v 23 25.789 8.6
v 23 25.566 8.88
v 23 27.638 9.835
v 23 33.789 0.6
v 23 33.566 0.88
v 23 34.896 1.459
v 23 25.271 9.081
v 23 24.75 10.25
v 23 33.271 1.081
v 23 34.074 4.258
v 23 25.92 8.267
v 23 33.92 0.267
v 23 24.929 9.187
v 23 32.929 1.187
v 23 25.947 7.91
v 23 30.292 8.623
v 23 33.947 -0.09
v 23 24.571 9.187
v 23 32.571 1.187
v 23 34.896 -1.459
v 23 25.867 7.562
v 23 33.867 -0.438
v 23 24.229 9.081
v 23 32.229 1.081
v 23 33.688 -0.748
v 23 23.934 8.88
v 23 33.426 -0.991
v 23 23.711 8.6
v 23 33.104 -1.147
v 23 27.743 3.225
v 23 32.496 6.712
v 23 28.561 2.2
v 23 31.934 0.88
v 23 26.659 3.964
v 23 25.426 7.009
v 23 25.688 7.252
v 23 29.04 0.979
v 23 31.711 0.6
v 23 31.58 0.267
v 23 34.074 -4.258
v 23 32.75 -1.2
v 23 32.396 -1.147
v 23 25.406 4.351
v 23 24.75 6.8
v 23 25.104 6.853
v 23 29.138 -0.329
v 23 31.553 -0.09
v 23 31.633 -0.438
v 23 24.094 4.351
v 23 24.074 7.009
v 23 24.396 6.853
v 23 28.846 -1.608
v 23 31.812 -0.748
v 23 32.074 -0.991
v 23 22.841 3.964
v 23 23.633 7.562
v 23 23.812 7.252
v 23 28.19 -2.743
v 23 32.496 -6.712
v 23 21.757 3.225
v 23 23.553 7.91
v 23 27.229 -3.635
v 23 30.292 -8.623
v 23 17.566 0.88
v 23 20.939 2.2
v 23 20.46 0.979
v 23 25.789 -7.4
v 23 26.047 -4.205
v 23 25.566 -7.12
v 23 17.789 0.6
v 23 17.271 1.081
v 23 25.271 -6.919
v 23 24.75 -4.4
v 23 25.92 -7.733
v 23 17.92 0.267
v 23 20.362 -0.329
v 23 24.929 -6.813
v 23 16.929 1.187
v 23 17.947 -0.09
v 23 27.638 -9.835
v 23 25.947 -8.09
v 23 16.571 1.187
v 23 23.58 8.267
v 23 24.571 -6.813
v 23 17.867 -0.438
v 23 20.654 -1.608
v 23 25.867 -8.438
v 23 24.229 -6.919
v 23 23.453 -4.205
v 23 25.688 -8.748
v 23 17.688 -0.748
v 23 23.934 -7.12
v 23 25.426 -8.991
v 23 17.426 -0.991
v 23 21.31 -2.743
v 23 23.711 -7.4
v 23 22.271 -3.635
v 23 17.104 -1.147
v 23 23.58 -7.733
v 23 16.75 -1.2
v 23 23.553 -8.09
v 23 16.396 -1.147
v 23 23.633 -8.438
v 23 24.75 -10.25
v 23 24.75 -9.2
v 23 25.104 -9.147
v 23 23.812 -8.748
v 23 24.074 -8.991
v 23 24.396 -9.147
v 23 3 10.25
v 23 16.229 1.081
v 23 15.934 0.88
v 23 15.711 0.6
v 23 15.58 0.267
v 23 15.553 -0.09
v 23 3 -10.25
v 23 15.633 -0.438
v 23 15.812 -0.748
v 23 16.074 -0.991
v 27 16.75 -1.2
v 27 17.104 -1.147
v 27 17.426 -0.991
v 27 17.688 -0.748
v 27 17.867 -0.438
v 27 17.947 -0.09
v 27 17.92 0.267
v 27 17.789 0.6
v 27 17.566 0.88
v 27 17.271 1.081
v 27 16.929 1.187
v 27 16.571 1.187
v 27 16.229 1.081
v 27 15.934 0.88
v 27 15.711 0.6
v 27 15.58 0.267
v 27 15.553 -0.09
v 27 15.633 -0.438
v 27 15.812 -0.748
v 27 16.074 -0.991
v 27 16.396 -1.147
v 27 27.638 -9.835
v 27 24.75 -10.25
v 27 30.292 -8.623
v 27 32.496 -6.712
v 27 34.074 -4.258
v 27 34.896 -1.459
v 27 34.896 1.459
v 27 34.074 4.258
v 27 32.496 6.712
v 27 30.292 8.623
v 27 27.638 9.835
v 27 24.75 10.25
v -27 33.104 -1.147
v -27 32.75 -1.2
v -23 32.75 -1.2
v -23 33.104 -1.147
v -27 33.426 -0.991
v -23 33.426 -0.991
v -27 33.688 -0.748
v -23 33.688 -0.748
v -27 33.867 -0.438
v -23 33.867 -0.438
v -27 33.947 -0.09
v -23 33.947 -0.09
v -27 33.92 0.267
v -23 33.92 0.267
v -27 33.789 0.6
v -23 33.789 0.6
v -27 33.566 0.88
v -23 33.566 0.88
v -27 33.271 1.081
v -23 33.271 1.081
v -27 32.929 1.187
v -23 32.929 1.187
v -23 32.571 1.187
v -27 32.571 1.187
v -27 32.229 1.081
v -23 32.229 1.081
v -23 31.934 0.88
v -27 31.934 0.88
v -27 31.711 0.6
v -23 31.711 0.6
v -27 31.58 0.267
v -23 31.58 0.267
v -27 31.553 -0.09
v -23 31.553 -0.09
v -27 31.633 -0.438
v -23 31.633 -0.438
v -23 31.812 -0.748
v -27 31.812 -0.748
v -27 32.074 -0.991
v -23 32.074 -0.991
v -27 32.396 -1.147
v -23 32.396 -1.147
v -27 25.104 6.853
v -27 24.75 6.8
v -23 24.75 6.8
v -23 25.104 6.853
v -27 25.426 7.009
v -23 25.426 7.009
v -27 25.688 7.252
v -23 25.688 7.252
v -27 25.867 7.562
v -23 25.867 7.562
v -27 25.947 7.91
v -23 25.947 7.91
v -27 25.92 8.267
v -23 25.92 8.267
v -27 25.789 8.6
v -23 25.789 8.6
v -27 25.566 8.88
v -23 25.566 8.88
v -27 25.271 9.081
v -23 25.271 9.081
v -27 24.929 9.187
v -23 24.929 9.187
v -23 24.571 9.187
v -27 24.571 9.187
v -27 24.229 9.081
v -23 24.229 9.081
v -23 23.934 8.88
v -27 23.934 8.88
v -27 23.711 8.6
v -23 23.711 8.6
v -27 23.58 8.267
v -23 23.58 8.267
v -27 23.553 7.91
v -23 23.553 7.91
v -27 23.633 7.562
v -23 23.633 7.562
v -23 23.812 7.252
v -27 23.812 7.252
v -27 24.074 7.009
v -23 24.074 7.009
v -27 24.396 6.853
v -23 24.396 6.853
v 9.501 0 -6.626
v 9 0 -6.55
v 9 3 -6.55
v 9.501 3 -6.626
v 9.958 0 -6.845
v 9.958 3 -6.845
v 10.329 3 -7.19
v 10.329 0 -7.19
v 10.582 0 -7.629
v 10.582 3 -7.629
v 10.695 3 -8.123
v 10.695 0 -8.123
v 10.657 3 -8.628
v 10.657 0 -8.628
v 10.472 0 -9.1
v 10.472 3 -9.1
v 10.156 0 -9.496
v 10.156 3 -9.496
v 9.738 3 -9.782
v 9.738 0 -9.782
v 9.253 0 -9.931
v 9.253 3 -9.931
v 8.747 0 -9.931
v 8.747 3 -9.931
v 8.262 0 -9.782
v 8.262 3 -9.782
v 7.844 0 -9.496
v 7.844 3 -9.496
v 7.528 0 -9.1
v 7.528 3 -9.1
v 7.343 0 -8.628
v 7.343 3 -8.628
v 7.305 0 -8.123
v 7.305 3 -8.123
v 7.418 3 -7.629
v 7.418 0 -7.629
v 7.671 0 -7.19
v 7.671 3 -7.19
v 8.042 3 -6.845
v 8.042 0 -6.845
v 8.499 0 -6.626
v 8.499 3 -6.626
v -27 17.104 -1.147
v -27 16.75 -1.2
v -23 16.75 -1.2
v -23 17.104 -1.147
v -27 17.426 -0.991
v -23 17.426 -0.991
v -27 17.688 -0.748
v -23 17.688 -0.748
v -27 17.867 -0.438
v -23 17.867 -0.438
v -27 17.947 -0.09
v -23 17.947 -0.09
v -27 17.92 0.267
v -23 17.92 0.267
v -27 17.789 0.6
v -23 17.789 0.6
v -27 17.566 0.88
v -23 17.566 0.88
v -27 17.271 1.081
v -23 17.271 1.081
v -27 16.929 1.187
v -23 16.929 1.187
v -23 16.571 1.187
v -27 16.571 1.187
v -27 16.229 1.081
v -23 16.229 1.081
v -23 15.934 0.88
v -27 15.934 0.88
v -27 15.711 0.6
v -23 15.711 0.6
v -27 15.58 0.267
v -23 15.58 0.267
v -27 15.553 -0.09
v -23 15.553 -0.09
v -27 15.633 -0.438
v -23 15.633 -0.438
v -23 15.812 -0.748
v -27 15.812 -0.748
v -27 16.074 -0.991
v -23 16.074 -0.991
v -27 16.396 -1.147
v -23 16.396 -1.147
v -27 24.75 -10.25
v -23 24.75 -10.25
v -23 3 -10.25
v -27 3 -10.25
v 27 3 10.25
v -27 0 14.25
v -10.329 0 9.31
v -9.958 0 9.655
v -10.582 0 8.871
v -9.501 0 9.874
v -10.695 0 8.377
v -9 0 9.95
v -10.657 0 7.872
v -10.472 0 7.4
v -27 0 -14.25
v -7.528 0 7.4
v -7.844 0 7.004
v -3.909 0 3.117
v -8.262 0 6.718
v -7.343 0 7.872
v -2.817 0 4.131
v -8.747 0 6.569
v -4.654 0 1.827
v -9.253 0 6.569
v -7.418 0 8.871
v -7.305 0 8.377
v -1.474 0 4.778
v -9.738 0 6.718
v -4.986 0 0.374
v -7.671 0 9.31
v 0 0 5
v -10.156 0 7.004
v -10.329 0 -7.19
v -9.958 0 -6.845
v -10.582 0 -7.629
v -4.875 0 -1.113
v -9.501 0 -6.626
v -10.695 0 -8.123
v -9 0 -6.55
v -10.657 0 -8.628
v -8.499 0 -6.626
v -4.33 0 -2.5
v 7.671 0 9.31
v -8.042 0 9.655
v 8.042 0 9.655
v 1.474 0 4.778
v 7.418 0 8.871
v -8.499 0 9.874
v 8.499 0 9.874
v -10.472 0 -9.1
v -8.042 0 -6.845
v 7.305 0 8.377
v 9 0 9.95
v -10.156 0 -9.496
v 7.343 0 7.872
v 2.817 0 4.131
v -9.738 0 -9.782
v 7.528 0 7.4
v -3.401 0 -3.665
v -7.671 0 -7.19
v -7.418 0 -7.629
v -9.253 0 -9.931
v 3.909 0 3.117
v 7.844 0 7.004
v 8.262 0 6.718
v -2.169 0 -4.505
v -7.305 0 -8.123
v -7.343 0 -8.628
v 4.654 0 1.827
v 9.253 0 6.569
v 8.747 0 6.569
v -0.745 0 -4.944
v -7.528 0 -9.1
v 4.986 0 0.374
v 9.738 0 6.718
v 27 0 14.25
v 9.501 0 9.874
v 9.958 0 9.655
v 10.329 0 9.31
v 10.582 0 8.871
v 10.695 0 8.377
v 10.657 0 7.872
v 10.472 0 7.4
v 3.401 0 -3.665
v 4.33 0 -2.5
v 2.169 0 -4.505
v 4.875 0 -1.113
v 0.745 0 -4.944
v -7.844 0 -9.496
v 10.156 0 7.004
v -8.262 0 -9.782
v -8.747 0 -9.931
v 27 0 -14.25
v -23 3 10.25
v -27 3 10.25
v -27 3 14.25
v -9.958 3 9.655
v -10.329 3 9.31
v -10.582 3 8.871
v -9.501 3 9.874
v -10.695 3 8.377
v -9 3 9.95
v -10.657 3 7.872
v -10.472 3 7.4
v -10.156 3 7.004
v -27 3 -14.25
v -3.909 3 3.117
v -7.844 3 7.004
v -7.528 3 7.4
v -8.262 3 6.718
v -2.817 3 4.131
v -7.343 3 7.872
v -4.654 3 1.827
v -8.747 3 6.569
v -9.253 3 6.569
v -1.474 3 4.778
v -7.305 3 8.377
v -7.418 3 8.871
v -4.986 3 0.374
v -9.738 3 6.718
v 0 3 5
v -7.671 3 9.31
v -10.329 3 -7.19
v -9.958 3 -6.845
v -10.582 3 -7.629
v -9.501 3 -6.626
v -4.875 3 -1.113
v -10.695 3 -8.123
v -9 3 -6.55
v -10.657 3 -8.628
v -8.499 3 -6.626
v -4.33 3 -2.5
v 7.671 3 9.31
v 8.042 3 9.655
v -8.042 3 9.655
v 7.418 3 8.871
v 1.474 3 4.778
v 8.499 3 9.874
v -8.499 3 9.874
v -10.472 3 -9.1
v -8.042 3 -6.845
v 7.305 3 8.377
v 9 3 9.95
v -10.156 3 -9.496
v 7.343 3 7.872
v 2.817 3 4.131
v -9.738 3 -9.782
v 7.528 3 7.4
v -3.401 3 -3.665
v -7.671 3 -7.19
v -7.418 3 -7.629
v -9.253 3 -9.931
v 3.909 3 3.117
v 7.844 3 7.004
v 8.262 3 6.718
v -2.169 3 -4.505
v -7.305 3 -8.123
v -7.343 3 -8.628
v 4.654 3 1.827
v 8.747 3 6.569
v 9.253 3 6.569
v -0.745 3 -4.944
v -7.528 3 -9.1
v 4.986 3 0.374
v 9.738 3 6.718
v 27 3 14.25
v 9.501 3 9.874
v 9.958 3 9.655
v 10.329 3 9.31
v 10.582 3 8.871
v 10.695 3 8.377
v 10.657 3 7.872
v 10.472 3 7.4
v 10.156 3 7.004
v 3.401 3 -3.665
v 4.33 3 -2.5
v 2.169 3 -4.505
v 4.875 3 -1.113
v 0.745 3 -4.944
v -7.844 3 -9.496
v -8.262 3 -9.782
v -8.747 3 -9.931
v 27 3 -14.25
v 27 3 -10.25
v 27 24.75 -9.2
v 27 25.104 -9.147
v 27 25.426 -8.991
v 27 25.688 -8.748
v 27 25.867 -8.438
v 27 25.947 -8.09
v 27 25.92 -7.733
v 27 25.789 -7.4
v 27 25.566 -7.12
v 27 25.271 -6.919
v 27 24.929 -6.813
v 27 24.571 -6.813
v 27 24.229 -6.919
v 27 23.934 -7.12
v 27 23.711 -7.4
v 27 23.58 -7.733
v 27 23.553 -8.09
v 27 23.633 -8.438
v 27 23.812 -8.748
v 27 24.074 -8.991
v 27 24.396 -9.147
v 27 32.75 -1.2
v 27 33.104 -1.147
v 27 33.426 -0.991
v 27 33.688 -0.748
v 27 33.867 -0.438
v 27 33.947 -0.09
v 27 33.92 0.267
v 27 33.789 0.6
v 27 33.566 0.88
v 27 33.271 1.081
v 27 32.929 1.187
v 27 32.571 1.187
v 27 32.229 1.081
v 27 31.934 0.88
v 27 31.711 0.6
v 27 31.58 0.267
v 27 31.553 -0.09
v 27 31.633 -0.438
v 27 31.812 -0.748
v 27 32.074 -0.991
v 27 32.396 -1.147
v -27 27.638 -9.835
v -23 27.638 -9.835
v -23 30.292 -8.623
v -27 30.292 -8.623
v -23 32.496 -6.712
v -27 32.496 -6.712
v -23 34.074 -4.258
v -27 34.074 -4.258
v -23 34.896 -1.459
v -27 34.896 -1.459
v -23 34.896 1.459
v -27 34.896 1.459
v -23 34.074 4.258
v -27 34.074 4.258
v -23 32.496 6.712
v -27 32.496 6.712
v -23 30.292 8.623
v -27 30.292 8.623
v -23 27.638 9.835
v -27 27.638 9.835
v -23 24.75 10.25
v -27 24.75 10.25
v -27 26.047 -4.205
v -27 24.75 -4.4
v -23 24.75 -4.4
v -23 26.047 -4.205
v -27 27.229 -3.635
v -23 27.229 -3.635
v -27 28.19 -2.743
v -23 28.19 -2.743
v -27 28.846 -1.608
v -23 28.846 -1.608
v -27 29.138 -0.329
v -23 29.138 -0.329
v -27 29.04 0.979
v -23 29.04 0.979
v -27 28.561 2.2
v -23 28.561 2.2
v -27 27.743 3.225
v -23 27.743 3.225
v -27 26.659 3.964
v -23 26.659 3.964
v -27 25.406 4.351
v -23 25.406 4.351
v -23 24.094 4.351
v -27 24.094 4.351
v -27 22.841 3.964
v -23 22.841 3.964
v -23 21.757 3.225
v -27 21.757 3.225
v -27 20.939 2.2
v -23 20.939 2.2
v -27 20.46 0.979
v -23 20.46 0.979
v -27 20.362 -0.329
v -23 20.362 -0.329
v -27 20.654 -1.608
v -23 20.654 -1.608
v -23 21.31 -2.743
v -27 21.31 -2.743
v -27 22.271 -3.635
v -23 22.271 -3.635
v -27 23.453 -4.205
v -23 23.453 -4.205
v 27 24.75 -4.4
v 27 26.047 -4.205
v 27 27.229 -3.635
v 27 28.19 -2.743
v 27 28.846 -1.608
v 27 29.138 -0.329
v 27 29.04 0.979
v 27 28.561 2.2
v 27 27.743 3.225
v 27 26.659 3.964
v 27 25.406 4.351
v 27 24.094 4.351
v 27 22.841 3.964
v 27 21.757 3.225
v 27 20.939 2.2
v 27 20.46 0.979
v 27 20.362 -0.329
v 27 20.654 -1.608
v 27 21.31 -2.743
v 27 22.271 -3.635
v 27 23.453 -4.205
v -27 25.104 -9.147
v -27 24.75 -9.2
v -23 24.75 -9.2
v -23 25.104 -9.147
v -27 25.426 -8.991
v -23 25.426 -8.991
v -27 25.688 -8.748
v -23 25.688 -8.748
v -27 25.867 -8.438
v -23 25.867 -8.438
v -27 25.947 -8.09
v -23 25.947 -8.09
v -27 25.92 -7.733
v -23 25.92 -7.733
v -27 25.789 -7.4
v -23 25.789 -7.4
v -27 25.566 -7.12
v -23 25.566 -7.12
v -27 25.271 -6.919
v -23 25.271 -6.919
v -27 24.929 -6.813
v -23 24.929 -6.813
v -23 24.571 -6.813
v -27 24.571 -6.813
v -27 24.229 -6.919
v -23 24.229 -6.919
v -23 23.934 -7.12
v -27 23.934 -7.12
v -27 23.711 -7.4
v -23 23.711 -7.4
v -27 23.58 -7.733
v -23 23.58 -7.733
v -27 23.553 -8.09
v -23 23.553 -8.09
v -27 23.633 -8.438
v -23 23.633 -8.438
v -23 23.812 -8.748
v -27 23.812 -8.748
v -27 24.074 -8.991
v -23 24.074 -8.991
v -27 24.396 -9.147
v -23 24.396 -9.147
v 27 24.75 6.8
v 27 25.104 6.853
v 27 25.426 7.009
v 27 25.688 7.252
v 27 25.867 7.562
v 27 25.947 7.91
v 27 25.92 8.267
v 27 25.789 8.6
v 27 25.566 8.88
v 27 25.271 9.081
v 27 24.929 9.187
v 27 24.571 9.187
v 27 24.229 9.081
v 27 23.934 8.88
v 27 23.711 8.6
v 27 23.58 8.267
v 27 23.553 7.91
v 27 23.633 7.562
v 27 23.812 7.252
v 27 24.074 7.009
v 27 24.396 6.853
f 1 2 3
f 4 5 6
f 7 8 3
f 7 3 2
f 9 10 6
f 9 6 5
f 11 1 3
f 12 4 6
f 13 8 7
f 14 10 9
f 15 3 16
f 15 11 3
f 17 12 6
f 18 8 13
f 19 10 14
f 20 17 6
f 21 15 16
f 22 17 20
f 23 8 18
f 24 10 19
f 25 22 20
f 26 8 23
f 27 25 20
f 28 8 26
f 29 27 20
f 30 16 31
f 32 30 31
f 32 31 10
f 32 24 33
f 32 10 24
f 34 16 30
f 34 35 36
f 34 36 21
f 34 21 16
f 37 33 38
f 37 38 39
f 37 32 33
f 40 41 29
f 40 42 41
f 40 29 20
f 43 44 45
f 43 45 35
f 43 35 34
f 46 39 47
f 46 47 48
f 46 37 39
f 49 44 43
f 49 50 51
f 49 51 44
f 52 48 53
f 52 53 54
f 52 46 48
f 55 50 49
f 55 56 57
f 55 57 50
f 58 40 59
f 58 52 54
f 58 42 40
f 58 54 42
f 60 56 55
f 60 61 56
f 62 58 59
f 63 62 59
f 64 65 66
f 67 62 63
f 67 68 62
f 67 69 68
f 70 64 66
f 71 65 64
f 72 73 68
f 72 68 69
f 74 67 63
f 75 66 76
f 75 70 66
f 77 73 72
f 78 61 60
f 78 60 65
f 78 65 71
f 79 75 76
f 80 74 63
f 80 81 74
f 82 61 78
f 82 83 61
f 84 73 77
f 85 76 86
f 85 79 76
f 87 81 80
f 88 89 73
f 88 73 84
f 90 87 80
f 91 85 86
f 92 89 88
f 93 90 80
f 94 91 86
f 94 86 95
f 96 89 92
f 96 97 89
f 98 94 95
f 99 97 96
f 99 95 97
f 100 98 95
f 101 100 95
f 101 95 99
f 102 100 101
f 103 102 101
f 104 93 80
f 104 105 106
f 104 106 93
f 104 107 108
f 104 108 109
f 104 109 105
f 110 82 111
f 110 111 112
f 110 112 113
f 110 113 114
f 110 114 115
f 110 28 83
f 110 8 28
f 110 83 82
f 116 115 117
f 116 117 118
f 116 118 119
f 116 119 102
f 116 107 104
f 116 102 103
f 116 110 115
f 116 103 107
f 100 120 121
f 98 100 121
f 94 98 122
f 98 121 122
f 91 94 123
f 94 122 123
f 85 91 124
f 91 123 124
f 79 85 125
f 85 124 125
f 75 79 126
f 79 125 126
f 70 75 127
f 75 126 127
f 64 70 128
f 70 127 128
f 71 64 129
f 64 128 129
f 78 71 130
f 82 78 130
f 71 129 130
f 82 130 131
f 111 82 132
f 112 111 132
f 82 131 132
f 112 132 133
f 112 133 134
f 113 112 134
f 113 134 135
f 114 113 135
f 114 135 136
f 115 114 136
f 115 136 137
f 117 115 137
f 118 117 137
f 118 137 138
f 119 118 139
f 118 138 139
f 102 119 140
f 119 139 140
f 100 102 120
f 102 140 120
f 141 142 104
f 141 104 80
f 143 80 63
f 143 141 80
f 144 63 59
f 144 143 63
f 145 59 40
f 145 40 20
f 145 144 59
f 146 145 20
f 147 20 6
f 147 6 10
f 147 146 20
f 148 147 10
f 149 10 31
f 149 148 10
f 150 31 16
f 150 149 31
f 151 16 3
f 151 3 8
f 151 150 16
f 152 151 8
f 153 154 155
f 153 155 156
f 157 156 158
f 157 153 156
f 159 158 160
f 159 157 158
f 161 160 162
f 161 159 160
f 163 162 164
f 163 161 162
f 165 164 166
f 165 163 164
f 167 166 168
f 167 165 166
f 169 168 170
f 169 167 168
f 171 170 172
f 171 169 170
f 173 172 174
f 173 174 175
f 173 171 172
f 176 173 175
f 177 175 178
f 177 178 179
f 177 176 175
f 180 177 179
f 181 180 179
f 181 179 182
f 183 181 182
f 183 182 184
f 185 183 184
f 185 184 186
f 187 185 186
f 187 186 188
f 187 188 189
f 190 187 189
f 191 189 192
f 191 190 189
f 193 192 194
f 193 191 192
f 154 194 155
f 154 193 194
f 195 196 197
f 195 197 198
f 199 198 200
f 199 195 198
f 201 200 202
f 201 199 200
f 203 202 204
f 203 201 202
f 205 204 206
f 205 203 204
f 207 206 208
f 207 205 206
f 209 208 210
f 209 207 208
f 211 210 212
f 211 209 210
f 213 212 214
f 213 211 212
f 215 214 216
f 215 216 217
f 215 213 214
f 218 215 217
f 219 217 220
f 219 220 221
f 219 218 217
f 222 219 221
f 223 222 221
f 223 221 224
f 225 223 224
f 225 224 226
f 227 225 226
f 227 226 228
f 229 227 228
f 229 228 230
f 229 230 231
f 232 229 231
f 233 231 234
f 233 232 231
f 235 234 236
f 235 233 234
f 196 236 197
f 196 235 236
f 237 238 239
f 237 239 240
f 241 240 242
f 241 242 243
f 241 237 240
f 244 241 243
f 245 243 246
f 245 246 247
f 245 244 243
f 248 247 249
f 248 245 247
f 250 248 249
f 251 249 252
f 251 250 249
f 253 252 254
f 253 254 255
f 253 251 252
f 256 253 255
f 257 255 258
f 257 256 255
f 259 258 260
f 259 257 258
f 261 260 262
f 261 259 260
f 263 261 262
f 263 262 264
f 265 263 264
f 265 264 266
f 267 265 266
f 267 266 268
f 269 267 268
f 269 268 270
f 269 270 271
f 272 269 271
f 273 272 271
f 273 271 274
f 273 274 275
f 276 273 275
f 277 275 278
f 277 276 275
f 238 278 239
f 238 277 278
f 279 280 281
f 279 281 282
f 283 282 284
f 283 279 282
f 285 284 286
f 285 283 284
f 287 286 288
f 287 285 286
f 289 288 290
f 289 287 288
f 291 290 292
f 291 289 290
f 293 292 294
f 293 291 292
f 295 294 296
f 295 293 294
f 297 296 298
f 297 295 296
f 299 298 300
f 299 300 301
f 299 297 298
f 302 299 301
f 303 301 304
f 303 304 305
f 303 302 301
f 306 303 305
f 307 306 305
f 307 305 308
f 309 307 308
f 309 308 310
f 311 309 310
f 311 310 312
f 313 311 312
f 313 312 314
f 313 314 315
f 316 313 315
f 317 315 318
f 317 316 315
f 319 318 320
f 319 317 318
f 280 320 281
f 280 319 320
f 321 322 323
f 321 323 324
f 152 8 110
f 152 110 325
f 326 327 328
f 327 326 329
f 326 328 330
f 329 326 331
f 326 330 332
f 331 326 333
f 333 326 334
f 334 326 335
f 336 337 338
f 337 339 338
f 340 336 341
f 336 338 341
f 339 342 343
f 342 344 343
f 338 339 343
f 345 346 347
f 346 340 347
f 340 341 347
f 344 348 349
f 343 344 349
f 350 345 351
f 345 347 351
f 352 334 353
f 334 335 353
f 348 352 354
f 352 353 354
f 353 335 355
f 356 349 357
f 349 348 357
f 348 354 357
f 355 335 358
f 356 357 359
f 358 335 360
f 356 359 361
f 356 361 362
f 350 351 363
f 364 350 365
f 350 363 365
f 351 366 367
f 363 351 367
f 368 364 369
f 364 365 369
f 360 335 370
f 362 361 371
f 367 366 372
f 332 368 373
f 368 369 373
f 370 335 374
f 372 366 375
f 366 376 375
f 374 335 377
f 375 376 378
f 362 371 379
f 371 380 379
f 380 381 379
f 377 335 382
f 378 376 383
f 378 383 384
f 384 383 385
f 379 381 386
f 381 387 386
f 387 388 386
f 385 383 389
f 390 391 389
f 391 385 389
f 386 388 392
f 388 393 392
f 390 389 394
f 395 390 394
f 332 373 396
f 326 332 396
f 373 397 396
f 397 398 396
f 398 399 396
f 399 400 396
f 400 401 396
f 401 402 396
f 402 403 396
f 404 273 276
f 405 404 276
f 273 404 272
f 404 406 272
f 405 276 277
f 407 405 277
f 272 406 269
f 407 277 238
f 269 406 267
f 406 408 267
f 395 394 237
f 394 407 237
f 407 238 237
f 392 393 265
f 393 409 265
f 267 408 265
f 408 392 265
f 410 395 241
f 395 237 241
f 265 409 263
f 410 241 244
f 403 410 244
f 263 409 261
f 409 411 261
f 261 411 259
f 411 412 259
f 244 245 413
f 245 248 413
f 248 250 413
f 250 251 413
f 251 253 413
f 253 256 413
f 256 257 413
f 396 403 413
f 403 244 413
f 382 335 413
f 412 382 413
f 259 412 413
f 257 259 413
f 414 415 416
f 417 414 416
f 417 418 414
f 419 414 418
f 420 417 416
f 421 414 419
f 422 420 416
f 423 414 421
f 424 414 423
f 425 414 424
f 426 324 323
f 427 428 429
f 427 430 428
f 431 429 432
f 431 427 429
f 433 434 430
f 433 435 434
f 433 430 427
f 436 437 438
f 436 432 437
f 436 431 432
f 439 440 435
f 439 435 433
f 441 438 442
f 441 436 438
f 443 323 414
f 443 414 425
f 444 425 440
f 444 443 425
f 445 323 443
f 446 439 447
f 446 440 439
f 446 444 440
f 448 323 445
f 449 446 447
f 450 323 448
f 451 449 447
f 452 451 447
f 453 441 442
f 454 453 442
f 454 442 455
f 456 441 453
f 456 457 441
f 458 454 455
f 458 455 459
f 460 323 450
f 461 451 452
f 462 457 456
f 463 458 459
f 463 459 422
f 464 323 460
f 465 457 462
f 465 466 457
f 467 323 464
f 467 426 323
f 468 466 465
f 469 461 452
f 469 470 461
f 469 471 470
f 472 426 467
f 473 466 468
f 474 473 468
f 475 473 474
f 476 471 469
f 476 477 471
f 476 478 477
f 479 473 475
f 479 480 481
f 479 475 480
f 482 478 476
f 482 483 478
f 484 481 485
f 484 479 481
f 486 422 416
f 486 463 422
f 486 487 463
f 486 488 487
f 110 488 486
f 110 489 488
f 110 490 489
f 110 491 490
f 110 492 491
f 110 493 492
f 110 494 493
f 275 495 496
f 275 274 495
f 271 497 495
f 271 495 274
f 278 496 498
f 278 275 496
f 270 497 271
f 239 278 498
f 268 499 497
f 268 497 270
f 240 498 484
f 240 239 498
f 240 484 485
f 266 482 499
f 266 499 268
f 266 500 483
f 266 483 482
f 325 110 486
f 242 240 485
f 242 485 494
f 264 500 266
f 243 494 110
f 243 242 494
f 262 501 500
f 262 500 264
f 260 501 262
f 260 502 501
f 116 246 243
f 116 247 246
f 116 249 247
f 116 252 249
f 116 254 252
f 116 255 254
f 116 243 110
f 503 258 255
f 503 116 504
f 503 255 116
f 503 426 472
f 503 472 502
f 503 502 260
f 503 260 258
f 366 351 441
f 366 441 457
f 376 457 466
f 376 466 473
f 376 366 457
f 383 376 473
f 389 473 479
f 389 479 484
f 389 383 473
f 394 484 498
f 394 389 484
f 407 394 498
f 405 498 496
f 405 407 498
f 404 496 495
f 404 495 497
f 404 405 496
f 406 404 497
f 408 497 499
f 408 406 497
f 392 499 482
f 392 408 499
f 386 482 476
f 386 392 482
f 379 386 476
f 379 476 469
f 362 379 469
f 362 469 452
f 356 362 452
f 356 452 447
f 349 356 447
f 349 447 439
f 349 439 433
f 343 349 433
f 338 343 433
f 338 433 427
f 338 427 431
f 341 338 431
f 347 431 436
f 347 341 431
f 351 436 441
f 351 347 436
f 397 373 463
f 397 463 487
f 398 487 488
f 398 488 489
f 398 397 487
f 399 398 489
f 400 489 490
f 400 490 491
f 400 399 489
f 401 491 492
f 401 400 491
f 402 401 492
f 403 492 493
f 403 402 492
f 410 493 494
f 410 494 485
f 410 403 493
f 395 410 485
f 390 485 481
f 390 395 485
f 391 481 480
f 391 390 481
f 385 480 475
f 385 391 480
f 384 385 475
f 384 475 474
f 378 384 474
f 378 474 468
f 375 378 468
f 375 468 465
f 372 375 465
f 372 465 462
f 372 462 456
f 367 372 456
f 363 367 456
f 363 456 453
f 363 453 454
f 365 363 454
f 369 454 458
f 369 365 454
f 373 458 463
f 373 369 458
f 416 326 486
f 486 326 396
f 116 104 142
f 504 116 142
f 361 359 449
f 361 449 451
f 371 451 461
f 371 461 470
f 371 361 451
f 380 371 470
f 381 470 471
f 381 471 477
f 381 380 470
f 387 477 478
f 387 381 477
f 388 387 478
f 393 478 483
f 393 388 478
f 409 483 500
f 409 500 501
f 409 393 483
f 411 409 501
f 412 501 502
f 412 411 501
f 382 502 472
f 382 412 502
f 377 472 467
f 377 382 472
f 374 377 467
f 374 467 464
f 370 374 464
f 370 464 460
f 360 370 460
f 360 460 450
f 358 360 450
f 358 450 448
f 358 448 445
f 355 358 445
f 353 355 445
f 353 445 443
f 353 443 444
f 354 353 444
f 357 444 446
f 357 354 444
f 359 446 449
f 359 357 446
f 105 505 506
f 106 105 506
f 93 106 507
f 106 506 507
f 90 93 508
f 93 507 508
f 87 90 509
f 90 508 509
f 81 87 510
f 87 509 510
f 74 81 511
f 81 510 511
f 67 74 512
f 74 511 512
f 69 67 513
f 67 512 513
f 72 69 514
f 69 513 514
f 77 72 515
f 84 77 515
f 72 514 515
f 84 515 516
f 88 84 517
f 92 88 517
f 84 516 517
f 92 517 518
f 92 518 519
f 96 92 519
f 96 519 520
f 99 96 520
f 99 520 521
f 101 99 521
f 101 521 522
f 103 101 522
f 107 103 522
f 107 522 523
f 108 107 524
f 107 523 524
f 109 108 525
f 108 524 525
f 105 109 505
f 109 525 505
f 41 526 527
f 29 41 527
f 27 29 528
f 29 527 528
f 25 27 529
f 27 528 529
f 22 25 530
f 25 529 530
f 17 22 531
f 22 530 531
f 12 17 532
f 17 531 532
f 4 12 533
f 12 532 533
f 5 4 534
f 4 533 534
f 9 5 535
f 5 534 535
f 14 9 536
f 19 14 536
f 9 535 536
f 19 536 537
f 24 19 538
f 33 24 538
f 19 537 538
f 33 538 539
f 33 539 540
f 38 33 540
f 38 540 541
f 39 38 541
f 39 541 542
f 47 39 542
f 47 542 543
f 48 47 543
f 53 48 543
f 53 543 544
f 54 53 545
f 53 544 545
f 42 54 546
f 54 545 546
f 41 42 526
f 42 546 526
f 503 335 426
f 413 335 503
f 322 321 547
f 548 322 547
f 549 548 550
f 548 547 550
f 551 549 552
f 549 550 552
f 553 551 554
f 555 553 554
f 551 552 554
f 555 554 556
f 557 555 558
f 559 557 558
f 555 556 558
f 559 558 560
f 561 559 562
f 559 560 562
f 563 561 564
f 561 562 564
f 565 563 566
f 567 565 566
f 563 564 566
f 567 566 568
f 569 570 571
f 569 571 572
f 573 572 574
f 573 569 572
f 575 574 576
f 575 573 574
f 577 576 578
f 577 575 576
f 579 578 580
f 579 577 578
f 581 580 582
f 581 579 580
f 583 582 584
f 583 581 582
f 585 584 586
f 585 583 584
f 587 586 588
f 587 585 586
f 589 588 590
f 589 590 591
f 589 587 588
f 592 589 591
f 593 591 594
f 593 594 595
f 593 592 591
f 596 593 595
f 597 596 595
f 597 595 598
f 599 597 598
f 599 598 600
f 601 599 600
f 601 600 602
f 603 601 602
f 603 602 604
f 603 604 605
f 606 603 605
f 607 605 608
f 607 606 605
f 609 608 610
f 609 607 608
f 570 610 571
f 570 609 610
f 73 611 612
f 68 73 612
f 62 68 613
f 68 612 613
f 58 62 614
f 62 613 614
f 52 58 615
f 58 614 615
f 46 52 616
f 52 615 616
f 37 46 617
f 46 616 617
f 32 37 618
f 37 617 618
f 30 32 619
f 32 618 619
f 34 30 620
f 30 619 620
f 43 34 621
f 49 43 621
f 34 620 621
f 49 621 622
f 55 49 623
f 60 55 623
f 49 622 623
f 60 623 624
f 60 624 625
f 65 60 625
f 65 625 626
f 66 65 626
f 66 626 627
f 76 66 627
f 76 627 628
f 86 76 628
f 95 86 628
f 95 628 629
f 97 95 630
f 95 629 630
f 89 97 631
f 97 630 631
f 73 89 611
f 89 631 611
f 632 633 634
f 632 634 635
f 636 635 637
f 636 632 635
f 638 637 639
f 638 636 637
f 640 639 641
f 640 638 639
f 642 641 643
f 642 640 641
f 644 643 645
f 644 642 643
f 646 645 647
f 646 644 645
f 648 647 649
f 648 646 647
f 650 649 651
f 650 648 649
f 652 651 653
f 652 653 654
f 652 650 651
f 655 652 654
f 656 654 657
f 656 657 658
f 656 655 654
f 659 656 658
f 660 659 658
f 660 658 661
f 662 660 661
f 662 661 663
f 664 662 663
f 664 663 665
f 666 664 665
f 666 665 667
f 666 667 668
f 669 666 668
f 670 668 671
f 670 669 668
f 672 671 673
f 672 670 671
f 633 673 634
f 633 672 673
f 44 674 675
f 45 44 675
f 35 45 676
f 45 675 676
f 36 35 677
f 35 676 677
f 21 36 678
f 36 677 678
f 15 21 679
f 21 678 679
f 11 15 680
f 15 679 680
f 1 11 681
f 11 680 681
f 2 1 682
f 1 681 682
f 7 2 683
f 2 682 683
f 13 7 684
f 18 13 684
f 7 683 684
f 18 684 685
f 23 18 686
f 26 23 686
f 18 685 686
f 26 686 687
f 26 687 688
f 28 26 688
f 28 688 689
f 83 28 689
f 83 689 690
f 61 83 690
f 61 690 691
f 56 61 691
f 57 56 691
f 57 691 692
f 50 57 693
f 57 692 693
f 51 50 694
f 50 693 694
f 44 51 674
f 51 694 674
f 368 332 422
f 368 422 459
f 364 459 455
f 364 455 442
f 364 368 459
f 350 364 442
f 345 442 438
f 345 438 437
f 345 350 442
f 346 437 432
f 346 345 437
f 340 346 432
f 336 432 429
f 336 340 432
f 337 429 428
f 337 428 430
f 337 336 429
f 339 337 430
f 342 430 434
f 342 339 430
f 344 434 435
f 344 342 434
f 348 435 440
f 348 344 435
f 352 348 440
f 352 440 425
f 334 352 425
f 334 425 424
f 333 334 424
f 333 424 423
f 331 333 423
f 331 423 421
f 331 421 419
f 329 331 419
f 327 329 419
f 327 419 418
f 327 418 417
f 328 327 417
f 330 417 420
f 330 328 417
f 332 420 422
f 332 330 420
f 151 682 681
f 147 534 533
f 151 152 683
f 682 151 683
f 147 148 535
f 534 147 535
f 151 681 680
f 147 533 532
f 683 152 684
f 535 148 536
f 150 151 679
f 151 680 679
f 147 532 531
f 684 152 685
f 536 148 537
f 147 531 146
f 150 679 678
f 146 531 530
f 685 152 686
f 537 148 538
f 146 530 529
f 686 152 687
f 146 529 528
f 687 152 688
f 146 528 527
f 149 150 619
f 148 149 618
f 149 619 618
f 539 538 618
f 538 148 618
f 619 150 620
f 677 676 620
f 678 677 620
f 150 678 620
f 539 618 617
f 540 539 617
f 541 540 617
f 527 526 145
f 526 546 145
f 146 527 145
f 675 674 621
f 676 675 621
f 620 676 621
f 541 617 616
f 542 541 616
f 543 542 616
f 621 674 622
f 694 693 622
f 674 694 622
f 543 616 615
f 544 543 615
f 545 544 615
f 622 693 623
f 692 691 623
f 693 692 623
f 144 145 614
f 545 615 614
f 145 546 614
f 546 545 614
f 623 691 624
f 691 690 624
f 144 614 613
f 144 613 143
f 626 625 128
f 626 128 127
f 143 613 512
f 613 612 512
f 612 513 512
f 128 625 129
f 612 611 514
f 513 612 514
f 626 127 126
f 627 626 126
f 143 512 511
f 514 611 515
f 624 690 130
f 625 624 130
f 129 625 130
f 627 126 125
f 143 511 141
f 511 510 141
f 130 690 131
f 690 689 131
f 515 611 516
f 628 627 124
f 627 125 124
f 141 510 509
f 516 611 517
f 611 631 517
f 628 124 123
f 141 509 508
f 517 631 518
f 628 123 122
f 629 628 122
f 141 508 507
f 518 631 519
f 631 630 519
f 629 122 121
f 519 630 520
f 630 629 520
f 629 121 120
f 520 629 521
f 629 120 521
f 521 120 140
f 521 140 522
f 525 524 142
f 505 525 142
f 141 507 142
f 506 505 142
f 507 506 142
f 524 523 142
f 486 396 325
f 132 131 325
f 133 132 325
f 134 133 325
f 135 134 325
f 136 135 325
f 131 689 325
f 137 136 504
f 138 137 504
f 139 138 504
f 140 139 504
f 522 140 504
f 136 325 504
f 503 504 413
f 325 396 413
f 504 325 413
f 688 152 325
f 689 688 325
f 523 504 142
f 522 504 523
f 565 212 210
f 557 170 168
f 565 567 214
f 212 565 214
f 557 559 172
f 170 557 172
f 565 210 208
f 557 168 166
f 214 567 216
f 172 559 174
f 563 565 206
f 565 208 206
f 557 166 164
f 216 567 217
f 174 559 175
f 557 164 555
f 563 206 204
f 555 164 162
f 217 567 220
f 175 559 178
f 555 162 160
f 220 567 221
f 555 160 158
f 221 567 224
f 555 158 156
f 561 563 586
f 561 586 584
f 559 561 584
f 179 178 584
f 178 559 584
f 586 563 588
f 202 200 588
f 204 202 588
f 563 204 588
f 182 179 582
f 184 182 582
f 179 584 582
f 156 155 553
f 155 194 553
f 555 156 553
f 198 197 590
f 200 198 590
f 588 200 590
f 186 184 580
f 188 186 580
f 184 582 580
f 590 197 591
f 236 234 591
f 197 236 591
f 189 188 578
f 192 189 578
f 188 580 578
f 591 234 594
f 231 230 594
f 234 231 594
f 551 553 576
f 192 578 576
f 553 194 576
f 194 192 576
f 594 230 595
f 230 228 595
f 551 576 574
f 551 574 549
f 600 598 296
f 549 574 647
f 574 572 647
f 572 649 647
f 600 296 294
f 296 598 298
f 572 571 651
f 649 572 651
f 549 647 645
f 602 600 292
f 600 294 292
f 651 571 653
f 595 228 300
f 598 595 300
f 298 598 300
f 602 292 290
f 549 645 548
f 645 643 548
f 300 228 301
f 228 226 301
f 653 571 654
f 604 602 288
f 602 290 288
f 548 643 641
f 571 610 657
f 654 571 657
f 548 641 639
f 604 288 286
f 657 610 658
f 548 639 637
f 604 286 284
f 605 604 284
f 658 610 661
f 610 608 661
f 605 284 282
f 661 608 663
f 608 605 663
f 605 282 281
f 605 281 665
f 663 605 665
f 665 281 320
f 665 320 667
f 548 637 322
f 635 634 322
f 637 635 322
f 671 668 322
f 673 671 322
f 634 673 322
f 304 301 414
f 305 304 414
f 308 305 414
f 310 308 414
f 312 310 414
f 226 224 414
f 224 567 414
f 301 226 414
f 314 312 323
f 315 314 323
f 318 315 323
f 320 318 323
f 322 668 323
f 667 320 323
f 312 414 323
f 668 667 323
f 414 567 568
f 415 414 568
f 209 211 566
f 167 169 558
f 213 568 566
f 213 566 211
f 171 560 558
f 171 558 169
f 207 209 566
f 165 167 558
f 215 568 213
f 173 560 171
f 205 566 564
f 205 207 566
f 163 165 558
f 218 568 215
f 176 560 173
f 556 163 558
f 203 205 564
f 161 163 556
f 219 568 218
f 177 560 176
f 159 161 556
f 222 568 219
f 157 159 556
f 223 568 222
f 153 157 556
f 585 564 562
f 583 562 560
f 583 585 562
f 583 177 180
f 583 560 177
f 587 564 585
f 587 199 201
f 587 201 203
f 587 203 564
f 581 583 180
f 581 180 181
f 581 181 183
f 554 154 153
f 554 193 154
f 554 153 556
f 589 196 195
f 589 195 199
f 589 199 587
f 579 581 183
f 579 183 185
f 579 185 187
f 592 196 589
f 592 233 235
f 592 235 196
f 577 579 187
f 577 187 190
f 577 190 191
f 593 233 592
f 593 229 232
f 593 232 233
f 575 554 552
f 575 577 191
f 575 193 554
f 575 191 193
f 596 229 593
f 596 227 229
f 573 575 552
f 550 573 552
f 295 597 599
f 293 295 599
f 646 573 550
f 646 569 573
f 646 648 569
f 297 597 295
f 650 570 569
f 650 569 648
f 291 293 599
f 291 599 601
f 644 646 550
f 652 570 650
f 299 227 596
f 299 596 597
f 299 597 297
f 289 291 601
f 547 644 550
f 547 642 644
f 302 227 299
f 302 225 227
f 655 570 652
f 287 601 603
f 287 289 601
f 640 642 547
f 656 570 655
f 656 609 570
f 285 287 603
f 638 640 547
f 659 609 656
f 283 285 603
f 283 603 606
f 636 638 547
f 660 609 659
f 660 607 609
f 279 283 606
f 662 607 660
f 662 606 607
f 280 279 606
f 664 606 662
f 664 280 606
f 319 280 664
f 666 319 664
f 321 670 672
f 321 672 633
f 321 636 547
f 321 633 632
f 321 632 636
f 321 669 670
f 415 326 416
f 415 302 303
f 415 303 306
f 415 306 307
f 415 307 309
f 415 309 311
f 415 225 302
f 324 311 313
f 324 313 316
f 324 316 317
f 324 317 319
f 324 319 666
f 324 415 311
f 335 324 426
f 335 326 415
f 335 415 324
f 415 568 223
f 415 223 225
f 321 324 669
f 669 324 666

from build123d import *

# Parameters (mm, degrees)
SKETCH1_W           = 36
SKETCH1_H           = 28.5
SKETCH1_R           = 1.7
SKETCH1_R_2         = 5
SKETCH1_W_2         = 9
BOSS_EXTRUDE2_DEPTH = 3
SKETCH2_W           = 4
SKETCH2_H           = 20.5
BOSS_EXTRUDE3_DEPTH = 21.75
SKETCH4_R           = 10.25
BOSS_EXTRUDE4_DEPTH = 4
SKETCH6_R           = 4.4
SKETCH6_R_2         = 1.2
CUT_EXTRUDE3_DEPTH  = 4


with BuildPart() as part:
    # Sketch1 → Boss-Extrude2 (new body)
    # profile 1 of 3: a face of its own
    with BuildSketch(Plane(origin=(0, 0, 0), x_dir=(1, 0, 0), z_dir=(0, 1, 0))):
        Rectangle(SKETCH1_W, SKETCH1_H)
        with Locations(Location((-9, -8.25, 0), (0, 0, 270))):
            Circle(SKETCH1_R, mode=Mode.SUBTRACT)
        with Locations(Location((9, -8.25, 0), (0, 0, 270))):
            Circle(SKETCH1_R, mode=Mode.SUBTRACT)
        with Locations(Location((-9, 8.25, 0), (0, 0, 270))):
            Circle(SKETCH1_R, mode=Mode.SUBTRACT)
        with Locations(Location((0, 0, 0), (0, 0, 270))):
            Circle(SKETCH1_R_2, mode=Mode.SUBTRACT)
        with Locations(Location((9, 8.25, 0), (0, 0, 270))):
            Circle(SKETCH1_R, mode=Mode.SUBTRACT)
    # profile 2 of 3: a face of its own
    with BuildSketch(Plane(origin=(0, 0, 0), x_dir=(1, 0, 0), z_dir=(0, 1, 0))):
        with Locations((-22.5, 0)):
            Rectangle(SKETCH1_W_2, SKETCH1_H)
    # profile 3 of 3: a face of its own
    with BuildSketch(Plane(origin=(0, 0, 0), x_dir=(1, 0, 0), z_dir=(0, 1, 0))):
        with Locations((22.5, 0)):
            Rectangle(SKETCH1_W_2, SKETCH1_H)
    extrude(amount=BOSS_EXTRUDE2_DEPTH)

    # Sketch2 → Boss-Extrude3 (add)
    with BuildSketch(Plane(origin=(0, 3, 0), x_dir=(1, 0, 0), z_dir=(0, 1, 0))):
        with Locations((25, 0)):
            Rectangle(SKETCH2_W, SKETCH2_H)
    boss_extrude3 = extrude(amount=BOSS_EXTRUDE3_DEPTH)

    # Sketch4 → Boss-Extrude4 (add)
    with BuildSketch(Plane(origin=(27, 0, 0), x_dir=(0, 0, -1), z_dir=(1, 0, 0))):
        with Locations((0, 24.75)):
            Circle(SKETCH4_R)
    boss_extrude4 = extrude(amount=-BOSS_EXTRUDE4_DEPTH)

    # Mirror1: Boss-Extrude3, Boss-Extrude4 across plane
    add(boss_extrude3.mirror(Plane(origin=(0, 0, 0), x_dir=(0, 0, 1), z_dir=(1, 0, 0))))
    add(boss_extrude4.mirror(Plane(origin=(0, 0, 0), x_dir=(0, 0, 1), z_dir=(1, 0, 0))))

    # Sketch6 → Cut-Extrude3 (cut)
    with BuildSketch(Plane(origin=(27, 0, 0), x_dir=(0, 0, -1), z_dir=(1, 0, 0))):
        with Locations((0, 24.75)):
            Circle(SKETCH6_R)
        with Locations((0, 32.75)):
            Circle(SKETCH6_R_2)
        with Locations((8, 24.75)):
            Circle(SKETCH6_R_2)
        with Locations((0, 16.75)):
            Circle(SKETCH6_R_2)
        with Locations((-8, 24.75)):
            Circle(SKETCH6_R_2)
    cut_extrude3 = extrude(amount=-CUT_EXTRUDE3_DEPTH, mode=Mode.SUBTRACT)

    # Mirror3: Cut-Extrude3 across plane
    add(cut_extrude3.mirror(Plane(origin=(0, 0, 0), x_dir=(0, 0, 1), z_dir=(1, 0, 0))), mode=Mode.SUBTRACT)


solid = part.part
